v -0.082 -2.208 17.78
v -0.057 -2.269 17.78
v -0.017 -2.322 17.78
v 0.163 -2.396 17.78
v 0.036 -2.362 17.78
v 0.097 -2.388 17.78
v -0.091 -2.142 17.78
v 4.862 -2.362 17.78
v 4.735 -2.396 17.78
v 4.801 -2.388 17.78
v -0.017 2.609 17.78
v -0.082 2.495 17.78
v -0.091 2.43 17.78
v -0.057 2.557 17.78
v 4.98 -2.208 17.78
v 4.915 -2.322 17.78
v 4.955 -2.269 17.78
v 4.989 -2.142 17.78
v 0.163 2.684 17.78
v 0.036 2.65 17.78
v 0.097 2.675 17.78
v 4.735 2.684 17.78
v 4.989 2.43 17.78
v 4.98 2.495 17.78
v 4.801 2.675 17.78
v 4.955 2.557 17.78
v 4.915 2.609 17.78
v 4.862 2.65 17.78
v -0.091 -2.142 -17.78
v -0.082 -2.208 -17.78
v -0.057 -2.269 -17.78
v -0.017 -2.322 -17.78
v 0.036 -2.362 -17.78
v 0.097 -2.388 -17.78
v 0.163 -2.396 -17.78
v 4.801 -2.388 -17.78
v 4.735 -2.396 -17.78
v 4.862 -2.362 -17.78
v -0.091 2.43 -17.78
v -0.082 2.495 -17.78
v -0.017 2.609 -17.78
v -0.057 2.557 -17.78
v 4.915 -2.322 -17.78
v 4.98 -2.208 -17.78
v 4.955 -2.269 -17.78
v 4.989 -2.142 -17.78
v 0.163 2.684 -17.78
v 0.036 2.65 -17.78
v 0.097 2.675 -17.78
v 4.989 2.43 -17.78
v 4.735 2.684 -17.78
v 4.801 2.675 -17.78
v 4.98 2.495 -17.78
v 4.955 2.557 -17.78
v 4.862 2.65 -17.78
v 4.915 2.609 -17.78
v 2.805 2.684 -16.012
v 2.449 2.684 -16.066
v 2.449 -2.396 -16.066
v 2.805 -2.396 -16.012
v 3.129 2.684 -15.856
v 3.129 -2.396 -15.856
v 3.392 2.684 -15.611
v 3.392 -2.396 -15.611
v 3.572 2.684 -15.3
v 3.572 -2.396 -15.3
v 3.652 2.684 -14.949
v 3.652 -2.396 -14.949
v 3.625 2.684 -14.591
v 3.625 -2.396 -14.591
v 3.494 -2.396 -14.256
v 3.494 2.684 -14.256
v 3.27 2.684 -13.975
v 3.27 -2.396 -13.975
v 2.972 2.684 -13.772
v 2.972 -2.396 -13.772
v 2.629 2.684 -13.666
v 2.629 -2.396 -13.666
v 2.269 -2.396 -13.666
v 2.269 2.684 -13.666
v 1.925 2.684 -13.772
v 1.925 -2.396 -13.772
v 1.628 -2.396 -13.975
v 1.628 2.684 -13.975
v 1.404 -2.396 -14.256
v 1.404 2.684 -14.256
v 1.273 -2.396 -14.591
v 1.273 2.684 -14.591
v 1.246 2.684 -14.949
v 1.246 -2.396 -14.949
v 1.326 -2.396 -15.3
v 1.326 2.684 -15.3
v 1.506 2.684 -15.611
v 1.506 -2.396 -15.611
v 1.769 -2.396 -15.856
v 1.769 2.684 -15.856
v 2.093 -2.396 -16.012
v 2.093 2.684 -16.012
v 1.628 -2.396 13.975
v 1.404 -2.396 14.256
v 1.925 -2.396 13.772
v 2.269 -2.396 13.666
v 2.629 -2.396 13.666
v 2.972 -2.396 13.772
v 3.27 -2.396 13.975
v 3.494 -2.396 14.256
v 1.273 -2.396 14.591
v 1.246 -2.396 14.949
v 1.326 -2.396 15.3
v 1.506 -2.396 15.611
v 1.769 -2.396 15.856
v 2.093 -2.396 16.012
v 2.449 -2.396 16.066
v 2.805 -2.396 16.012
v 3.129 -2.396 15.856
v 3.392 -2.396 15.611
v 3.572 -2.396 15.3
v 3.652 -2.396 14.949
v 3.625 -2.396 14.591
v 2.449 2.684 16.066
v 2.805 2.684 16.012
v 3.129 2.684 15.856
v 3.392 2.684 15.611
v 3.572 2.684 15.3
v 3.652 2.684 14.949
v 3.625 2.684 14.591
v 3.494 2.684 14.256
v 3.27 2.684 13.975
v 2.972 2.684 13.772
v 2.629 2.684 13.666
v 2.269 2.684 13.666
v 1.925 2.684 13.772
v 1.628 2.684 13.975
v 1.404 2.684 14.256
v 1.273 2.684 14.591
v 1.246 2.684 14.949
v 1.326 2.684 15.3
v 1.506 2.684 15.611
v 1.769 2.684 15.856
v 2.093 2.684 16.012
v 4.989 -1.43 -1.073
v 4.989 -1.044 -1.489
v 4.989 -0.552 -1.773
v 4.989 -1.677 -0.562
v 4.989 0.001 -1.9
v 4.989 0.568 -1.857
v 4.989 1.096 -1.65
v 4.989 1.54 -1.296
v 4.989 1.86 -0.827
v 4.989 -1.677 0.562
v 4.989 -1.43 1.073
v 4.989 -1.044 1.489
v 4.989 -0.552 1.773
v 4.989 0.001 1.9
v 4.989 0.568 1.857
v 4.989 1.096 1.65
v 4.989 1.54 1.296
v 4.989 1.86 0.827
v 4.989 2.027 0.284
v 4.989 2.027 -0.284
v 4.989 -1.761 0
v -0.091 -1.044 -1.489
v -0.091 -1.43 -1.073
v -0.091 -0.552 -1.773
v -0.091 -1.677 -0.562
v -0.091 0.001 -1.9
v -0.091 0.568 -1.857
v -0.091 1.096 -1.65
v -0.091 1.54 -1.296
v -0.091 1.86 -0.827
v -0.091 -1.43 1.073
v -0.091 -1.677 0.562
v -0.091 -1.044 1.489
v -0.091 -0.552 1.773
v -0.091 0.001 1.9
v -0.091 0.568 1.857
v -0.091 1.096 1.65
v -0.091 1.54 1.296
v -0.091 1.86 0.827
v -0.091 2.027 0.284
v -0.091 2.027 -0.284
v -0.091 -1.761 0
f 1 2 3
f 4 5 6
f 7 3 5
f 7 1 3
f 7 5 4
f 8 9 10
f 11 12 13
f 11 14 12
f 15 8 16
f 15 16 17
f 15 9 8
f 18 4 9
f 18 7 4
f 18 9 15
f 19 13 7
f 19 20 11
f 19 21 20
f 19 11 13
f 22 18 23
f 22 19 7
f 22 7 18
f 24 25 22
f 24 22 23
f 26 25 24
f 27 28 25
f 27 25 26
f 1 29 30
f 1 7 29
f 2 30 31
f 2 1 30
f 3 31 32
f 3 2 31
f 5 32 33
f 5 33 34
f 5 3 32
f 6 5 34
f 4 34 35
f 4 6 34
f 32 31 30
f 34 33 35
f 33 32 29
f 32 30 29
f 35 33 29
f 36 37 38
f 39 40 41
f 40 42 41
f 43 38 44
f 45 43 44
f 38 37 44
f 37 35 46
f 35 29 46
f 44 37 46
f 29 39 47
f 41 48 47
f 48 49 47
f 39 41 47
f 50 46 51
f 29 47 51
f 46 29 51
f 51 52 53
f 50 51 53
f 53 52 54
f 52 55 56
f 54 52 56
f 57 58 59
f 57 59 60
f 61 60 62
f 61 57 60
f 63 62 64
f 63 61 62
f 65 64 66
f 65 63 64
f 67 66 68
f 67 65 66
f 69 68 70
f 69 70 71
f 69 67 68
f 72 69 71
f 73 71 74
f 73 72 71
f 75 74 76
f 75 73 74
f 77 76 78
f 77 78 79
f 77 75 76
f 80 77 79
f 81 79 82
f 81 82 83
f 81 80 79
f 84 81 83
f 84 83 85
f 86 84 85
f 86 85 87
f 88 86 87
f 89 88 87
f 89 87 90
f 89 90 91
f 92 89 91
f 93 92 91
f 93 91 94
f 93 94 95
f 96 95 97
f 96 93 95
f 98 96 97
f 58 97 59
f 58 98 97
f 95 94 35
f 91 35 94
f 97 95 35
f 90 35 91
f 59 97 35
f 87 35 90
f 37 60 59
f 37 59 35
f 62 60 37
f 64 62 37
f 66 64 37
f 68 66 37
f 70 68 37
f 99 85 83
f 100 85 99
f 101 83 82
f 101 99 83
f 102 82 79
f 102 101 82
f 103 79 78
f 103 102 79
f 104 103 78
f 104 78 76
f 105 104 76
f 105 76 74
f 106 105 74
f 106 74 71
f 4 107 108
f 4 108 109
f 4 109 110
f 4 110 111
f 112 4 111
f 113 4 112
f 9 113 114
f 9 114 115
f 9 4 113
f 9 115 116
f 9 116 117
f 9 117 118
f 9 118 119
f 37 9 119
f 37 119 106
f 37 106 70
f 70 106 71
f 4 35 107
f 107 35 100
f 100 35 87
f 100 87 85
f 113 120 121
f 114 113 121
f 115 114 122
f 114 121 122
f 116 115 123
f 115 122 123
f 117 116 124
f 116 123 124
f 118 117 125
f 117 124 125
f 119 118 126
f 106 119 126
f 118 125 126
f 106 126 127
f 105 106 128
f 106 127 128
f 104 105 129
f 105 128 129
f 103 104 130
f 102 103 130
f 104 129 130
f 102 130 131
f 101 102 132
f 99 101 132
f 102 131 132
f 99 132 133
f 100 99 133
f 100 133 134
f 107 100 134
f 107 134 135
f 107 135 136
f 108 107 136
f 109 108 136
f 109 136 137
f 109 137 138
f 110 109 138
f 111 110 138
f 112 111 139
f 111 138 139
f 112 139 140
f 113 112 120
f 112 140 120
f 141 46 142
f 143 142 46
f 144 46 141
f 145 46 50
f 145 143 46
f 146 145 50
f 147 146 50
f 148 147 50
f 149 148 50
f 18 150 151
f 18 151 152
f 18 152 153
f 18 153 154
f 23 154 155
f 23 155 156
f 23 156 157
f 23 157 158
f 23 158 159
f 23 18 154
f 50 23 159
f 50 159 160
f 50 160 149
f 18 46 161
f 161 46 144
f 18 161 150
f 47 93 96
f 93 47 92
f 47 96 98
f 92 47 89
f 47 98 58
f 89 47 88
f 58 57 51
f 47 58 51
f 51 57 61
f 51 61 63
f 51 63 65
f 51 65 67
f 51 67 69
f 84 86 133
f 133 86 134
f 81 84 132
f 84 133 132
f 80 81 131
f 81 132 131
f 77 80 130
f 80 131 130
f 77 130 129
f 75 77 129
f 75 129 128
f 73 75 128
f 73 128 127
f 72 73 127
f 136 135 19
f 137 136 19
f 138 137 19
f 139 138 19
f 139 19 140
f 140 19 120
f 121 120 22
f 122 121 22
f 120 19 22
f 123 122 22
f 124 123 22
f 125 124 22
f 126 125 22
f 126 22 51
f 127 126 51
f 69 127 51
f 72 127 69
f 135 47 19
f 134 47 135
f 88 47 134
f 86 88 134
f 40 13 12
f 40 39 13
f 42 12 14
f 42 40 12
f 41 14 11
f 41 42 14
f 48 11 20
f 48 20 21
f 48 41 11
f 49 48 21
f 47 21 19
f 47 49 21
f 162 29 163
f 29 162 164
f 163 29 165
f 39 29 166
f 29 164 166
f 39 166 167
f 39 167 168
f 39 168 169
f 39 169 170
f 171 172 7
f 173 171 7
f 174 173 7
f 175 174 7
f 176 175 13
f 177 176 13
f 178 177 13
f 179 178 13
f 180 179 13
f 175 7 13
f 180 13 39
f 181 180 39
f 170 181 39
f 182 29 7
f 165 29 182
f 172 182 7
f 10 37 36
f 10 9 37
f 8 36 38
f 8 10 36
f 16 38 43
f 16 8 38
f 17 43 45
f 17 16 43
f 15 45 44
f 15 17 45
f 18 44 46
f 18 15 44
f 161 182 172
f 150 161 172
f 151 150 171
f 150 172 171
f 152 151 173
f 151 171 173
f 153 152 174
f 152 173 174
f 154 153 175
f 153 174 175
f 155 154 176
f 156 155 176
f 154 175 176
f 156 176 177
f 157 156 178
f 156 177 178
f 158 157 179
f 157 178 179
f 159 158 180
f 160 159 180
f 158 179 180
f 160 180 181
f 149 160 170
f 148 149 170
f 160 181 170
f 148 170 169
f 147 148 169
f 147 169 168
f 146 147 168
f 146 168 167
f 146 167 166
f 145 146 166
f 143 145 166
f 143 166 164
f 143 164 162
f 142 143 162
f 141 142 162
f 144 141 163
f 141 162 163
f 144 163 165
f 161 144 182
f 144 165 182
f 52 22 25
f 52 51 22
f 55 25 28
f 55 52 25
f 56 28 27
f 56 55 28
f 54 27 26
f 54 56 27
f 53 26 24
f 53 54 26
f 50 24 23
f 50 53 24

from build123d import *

# Parameters (mm, degrees)
SKETCH7_W           = 5.08
SKETCH7_H           = 5.08
BOSS_EXTRUDE3_DEPTH = 17.78
SKETCH8_R           = 1.2065
CUT_EXTRUDE1_DEPTH  = 5.08
FILLET1_R           = 0.254
SKETCH11_R          = 1.905
CUT_EXTRUDE2_DEPTH  = 5.08


with BuildPart() as part:
    # Sketch7 → Boss-Extrude3 (new body)
    with BuildSketch(Plane.XY):
        with Locations((2.448966181, 0.143745058)):
            Rectangle(SKETCH7_W, SKETCH7_H)
    boss_extrude3 = extrude(amount=BOSS_EXTRUDE3_DEPTH)

    # Sketch8 → Cut-Extrude1 (cut)
    with BuildSketch(Plane(origin=(0, 2.683745058, 0), x_dir=(1, 0, 0), z_dir=(0, 1, 0))):
        with Locations(Location((2.448966181, -14.859, 0), (0, 0, 270))):
            Circle(SKETCH8_R)
    cut_extrude1 = extrude(amount=-CUT_EXTRUDE1_DEPTH, mode=Mode.SUBTRACT)

    # Mirror2: Boss-Extrude3, Cut-Extrude1 across plane
    add(boss_extrude3.mirror(Plane.XY))
    add(cut_extrude1.mirror(Plane.XY), mode=Mode.SUBTRACT)

    # Fillet1
    fillet1_edges = [part.edges().sort_by_distance(p)[0] for p in [
        (-0.091033819, 2.683745058, 0),
        (4.988966181, 2.683745058, 0),
        (4.988966181, -2.396254942, 0),
        (-0.091033819, -2.396254942, 0),
    ]]
    fillet(fillet1_edges, radius=FILLET1_R)

    # Sketch11 → Cut-Extrude2 (cut)
    with BuildSketch(Plane.ZY.offset(0.091033819)):
        with Locations(Location((0, 0.143745058, 0), (0, 0, 270))):
            Circle(SKETCH11_R)
    extrude(amount=-CUT_EXTRUDE2_DEPTH, mode=Mode.SUBTRACT)


solid = part.part
